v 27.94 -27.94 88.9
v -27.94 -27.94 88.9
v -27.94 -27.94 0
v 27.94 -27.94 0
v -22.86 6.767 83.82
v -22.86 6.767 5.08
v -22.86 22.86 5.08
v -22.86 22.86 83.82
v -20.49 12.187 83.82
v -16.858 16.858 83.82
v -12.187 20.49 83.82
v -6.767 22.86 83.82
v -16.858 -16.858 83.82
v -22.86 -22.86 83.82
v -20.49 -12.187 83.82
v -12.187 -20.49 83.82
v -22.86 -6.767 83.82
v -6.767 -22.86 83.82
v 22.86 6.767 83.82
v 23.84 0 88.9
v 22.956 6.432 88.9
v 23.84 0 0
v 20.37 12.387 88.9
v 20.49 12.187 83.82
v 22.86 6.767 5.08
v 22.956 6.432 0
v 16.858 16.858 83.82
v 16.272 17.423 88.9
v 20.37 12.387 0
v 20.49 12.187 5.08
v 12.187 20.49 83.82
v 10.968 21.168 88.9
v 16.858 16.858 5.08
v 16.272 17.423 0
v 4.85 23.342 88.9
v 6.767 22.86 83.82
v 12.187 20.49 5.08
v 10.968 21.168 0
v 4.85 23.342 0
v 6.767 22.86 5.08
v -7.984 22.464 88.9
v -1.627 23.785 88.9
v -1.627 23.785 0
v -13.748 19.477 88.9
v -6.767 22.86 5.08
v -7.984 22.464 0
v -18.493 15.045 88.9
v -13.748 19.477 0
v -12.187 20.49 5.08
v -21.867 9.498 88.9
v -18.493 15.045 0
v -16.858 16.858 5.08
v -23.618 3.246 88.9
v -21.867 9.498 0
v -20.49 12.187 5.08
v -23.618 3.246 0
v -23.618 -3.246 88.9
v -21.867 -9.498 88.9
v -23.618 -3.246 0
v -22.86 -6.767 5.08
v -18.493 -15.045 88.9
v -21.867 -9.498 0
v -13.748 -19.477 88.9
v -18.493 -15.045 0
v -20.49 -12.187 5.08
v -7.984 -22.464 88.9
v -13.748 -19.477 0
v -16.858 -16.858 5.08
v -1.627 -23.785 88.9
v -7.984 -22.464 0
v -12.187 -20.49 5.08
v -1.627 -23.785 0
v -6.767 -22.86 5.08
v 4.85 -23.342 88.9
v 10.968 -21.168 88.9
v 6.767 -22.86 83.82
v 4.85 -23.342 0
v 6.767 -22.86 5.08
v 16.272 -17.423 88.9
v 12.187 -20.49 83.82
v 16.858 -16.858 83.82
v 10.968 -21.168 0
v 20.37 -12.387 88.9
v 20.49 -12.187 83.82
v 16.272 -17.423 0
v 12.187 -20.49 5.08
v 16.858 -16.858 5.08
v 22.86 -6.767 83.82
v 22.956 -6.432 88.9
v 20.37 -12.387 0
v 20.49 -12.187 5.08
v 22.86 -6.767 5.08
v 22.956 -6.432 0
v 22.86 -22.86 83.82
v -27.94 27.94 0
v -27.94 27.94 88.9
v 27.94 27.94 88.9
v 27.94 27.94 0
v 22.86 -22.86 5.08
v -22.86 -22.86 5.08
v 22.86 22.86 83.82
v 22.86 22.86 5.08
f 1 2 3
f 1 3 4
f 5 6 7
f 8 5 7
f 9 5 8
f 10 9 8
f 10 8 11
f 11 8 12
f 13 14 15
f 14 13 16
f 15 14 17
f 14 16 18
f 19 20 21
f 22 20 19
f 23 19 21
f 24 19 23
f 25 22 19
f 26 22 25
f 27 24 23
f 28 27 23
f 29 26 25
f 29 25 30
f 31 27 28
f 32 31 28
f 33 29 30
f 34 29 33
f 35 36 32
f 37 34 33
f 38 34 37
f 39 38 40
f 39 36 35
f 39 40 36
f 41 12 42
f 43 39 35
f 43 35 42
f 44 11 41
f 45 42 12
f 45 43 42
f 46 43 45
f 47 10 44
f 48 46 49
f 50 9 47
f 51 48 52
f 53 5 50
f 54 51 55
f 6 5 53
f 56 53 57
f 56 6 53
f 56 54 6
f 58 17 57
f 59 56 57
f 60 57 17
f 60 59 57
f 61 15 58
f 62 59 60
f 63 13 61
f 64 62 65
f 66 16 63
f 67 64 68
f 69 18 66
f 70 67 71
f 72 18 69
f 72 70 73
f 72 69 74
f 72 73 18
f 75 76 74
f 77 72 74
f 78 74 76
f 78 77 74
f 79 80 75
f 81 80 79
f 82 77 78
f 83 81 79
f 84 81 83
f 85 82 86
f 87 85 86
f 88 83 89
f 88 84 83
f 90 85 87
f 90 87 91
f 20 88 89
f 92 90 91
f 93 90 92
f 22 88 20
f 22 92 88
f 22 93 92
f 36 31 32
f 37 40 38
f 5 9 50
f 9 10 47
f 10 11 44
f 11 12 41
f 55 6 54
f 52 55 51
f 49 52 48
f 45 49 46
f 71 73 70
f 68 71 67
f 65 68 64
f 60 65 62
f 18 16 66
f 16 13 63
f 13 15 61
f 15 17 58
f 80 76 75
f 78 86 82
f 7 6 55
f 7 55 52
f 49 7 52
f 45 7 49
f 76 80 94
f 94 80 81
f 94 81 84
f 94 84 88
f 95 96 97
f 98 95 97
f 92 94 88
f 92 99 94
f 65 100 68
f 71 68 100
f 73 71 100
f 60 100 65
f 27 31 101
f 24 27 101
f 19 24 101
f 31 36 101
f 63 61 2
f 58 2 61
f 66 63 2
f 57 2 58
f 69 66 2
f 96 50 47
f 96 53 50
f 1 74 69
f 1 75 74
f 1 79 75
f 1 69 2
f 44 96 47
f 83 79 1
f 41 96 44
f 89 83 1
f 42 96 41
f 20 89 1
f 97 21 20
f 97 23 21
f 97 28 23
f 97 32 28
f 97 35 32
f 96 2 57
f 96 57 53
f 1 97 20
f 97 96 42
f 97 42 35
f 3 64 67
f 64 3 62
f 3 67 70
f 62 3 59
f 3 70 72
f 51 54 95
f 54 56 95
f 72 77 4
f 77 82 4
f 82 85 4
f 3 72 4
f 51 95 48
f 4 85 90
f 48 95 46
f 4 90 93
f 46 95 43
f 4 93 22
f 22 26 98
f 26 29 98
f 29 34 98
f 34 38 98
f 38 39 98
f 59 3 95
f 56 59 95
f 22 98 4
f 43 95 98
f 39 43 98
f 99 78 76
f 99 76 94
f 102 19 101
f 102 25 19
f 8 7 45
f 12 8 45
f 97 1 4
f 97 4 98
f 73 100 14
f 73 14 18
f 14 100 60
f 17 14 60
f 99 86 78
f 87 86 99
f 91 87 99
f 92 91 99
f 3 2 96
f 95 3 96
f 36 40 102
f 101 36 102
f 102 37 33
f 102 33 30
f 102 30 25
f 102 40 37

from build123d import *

# Parameters (mm, degrees)
F0_W     = 55.88
F0_H     = 55.88
F1_DEPTH = 88.9
F2_T     = -5.08
F3_R     = 23.8404105374
F4_DEPTH = 88.9


with BuildPart() as f1:
    # F0 (on Top) → F1 (new body)
    with BuildSketch(Plane.XY):
        Rectangle(F0_W, F0_H)
    extrude(amount=F1_DEPTH)

    # F2 (hollow: no face is removed)
    offset(amount=F2_T, mode=Mode.SUBTRACT)

    # F3 (on Top) → F4 (cut)
    with BuildSketch(Plane.XY):
        Circle(F3_R)
    extrude(amount=F4_DEPTH, mode=Mode.SUBTRACT)


solid = f1.part
